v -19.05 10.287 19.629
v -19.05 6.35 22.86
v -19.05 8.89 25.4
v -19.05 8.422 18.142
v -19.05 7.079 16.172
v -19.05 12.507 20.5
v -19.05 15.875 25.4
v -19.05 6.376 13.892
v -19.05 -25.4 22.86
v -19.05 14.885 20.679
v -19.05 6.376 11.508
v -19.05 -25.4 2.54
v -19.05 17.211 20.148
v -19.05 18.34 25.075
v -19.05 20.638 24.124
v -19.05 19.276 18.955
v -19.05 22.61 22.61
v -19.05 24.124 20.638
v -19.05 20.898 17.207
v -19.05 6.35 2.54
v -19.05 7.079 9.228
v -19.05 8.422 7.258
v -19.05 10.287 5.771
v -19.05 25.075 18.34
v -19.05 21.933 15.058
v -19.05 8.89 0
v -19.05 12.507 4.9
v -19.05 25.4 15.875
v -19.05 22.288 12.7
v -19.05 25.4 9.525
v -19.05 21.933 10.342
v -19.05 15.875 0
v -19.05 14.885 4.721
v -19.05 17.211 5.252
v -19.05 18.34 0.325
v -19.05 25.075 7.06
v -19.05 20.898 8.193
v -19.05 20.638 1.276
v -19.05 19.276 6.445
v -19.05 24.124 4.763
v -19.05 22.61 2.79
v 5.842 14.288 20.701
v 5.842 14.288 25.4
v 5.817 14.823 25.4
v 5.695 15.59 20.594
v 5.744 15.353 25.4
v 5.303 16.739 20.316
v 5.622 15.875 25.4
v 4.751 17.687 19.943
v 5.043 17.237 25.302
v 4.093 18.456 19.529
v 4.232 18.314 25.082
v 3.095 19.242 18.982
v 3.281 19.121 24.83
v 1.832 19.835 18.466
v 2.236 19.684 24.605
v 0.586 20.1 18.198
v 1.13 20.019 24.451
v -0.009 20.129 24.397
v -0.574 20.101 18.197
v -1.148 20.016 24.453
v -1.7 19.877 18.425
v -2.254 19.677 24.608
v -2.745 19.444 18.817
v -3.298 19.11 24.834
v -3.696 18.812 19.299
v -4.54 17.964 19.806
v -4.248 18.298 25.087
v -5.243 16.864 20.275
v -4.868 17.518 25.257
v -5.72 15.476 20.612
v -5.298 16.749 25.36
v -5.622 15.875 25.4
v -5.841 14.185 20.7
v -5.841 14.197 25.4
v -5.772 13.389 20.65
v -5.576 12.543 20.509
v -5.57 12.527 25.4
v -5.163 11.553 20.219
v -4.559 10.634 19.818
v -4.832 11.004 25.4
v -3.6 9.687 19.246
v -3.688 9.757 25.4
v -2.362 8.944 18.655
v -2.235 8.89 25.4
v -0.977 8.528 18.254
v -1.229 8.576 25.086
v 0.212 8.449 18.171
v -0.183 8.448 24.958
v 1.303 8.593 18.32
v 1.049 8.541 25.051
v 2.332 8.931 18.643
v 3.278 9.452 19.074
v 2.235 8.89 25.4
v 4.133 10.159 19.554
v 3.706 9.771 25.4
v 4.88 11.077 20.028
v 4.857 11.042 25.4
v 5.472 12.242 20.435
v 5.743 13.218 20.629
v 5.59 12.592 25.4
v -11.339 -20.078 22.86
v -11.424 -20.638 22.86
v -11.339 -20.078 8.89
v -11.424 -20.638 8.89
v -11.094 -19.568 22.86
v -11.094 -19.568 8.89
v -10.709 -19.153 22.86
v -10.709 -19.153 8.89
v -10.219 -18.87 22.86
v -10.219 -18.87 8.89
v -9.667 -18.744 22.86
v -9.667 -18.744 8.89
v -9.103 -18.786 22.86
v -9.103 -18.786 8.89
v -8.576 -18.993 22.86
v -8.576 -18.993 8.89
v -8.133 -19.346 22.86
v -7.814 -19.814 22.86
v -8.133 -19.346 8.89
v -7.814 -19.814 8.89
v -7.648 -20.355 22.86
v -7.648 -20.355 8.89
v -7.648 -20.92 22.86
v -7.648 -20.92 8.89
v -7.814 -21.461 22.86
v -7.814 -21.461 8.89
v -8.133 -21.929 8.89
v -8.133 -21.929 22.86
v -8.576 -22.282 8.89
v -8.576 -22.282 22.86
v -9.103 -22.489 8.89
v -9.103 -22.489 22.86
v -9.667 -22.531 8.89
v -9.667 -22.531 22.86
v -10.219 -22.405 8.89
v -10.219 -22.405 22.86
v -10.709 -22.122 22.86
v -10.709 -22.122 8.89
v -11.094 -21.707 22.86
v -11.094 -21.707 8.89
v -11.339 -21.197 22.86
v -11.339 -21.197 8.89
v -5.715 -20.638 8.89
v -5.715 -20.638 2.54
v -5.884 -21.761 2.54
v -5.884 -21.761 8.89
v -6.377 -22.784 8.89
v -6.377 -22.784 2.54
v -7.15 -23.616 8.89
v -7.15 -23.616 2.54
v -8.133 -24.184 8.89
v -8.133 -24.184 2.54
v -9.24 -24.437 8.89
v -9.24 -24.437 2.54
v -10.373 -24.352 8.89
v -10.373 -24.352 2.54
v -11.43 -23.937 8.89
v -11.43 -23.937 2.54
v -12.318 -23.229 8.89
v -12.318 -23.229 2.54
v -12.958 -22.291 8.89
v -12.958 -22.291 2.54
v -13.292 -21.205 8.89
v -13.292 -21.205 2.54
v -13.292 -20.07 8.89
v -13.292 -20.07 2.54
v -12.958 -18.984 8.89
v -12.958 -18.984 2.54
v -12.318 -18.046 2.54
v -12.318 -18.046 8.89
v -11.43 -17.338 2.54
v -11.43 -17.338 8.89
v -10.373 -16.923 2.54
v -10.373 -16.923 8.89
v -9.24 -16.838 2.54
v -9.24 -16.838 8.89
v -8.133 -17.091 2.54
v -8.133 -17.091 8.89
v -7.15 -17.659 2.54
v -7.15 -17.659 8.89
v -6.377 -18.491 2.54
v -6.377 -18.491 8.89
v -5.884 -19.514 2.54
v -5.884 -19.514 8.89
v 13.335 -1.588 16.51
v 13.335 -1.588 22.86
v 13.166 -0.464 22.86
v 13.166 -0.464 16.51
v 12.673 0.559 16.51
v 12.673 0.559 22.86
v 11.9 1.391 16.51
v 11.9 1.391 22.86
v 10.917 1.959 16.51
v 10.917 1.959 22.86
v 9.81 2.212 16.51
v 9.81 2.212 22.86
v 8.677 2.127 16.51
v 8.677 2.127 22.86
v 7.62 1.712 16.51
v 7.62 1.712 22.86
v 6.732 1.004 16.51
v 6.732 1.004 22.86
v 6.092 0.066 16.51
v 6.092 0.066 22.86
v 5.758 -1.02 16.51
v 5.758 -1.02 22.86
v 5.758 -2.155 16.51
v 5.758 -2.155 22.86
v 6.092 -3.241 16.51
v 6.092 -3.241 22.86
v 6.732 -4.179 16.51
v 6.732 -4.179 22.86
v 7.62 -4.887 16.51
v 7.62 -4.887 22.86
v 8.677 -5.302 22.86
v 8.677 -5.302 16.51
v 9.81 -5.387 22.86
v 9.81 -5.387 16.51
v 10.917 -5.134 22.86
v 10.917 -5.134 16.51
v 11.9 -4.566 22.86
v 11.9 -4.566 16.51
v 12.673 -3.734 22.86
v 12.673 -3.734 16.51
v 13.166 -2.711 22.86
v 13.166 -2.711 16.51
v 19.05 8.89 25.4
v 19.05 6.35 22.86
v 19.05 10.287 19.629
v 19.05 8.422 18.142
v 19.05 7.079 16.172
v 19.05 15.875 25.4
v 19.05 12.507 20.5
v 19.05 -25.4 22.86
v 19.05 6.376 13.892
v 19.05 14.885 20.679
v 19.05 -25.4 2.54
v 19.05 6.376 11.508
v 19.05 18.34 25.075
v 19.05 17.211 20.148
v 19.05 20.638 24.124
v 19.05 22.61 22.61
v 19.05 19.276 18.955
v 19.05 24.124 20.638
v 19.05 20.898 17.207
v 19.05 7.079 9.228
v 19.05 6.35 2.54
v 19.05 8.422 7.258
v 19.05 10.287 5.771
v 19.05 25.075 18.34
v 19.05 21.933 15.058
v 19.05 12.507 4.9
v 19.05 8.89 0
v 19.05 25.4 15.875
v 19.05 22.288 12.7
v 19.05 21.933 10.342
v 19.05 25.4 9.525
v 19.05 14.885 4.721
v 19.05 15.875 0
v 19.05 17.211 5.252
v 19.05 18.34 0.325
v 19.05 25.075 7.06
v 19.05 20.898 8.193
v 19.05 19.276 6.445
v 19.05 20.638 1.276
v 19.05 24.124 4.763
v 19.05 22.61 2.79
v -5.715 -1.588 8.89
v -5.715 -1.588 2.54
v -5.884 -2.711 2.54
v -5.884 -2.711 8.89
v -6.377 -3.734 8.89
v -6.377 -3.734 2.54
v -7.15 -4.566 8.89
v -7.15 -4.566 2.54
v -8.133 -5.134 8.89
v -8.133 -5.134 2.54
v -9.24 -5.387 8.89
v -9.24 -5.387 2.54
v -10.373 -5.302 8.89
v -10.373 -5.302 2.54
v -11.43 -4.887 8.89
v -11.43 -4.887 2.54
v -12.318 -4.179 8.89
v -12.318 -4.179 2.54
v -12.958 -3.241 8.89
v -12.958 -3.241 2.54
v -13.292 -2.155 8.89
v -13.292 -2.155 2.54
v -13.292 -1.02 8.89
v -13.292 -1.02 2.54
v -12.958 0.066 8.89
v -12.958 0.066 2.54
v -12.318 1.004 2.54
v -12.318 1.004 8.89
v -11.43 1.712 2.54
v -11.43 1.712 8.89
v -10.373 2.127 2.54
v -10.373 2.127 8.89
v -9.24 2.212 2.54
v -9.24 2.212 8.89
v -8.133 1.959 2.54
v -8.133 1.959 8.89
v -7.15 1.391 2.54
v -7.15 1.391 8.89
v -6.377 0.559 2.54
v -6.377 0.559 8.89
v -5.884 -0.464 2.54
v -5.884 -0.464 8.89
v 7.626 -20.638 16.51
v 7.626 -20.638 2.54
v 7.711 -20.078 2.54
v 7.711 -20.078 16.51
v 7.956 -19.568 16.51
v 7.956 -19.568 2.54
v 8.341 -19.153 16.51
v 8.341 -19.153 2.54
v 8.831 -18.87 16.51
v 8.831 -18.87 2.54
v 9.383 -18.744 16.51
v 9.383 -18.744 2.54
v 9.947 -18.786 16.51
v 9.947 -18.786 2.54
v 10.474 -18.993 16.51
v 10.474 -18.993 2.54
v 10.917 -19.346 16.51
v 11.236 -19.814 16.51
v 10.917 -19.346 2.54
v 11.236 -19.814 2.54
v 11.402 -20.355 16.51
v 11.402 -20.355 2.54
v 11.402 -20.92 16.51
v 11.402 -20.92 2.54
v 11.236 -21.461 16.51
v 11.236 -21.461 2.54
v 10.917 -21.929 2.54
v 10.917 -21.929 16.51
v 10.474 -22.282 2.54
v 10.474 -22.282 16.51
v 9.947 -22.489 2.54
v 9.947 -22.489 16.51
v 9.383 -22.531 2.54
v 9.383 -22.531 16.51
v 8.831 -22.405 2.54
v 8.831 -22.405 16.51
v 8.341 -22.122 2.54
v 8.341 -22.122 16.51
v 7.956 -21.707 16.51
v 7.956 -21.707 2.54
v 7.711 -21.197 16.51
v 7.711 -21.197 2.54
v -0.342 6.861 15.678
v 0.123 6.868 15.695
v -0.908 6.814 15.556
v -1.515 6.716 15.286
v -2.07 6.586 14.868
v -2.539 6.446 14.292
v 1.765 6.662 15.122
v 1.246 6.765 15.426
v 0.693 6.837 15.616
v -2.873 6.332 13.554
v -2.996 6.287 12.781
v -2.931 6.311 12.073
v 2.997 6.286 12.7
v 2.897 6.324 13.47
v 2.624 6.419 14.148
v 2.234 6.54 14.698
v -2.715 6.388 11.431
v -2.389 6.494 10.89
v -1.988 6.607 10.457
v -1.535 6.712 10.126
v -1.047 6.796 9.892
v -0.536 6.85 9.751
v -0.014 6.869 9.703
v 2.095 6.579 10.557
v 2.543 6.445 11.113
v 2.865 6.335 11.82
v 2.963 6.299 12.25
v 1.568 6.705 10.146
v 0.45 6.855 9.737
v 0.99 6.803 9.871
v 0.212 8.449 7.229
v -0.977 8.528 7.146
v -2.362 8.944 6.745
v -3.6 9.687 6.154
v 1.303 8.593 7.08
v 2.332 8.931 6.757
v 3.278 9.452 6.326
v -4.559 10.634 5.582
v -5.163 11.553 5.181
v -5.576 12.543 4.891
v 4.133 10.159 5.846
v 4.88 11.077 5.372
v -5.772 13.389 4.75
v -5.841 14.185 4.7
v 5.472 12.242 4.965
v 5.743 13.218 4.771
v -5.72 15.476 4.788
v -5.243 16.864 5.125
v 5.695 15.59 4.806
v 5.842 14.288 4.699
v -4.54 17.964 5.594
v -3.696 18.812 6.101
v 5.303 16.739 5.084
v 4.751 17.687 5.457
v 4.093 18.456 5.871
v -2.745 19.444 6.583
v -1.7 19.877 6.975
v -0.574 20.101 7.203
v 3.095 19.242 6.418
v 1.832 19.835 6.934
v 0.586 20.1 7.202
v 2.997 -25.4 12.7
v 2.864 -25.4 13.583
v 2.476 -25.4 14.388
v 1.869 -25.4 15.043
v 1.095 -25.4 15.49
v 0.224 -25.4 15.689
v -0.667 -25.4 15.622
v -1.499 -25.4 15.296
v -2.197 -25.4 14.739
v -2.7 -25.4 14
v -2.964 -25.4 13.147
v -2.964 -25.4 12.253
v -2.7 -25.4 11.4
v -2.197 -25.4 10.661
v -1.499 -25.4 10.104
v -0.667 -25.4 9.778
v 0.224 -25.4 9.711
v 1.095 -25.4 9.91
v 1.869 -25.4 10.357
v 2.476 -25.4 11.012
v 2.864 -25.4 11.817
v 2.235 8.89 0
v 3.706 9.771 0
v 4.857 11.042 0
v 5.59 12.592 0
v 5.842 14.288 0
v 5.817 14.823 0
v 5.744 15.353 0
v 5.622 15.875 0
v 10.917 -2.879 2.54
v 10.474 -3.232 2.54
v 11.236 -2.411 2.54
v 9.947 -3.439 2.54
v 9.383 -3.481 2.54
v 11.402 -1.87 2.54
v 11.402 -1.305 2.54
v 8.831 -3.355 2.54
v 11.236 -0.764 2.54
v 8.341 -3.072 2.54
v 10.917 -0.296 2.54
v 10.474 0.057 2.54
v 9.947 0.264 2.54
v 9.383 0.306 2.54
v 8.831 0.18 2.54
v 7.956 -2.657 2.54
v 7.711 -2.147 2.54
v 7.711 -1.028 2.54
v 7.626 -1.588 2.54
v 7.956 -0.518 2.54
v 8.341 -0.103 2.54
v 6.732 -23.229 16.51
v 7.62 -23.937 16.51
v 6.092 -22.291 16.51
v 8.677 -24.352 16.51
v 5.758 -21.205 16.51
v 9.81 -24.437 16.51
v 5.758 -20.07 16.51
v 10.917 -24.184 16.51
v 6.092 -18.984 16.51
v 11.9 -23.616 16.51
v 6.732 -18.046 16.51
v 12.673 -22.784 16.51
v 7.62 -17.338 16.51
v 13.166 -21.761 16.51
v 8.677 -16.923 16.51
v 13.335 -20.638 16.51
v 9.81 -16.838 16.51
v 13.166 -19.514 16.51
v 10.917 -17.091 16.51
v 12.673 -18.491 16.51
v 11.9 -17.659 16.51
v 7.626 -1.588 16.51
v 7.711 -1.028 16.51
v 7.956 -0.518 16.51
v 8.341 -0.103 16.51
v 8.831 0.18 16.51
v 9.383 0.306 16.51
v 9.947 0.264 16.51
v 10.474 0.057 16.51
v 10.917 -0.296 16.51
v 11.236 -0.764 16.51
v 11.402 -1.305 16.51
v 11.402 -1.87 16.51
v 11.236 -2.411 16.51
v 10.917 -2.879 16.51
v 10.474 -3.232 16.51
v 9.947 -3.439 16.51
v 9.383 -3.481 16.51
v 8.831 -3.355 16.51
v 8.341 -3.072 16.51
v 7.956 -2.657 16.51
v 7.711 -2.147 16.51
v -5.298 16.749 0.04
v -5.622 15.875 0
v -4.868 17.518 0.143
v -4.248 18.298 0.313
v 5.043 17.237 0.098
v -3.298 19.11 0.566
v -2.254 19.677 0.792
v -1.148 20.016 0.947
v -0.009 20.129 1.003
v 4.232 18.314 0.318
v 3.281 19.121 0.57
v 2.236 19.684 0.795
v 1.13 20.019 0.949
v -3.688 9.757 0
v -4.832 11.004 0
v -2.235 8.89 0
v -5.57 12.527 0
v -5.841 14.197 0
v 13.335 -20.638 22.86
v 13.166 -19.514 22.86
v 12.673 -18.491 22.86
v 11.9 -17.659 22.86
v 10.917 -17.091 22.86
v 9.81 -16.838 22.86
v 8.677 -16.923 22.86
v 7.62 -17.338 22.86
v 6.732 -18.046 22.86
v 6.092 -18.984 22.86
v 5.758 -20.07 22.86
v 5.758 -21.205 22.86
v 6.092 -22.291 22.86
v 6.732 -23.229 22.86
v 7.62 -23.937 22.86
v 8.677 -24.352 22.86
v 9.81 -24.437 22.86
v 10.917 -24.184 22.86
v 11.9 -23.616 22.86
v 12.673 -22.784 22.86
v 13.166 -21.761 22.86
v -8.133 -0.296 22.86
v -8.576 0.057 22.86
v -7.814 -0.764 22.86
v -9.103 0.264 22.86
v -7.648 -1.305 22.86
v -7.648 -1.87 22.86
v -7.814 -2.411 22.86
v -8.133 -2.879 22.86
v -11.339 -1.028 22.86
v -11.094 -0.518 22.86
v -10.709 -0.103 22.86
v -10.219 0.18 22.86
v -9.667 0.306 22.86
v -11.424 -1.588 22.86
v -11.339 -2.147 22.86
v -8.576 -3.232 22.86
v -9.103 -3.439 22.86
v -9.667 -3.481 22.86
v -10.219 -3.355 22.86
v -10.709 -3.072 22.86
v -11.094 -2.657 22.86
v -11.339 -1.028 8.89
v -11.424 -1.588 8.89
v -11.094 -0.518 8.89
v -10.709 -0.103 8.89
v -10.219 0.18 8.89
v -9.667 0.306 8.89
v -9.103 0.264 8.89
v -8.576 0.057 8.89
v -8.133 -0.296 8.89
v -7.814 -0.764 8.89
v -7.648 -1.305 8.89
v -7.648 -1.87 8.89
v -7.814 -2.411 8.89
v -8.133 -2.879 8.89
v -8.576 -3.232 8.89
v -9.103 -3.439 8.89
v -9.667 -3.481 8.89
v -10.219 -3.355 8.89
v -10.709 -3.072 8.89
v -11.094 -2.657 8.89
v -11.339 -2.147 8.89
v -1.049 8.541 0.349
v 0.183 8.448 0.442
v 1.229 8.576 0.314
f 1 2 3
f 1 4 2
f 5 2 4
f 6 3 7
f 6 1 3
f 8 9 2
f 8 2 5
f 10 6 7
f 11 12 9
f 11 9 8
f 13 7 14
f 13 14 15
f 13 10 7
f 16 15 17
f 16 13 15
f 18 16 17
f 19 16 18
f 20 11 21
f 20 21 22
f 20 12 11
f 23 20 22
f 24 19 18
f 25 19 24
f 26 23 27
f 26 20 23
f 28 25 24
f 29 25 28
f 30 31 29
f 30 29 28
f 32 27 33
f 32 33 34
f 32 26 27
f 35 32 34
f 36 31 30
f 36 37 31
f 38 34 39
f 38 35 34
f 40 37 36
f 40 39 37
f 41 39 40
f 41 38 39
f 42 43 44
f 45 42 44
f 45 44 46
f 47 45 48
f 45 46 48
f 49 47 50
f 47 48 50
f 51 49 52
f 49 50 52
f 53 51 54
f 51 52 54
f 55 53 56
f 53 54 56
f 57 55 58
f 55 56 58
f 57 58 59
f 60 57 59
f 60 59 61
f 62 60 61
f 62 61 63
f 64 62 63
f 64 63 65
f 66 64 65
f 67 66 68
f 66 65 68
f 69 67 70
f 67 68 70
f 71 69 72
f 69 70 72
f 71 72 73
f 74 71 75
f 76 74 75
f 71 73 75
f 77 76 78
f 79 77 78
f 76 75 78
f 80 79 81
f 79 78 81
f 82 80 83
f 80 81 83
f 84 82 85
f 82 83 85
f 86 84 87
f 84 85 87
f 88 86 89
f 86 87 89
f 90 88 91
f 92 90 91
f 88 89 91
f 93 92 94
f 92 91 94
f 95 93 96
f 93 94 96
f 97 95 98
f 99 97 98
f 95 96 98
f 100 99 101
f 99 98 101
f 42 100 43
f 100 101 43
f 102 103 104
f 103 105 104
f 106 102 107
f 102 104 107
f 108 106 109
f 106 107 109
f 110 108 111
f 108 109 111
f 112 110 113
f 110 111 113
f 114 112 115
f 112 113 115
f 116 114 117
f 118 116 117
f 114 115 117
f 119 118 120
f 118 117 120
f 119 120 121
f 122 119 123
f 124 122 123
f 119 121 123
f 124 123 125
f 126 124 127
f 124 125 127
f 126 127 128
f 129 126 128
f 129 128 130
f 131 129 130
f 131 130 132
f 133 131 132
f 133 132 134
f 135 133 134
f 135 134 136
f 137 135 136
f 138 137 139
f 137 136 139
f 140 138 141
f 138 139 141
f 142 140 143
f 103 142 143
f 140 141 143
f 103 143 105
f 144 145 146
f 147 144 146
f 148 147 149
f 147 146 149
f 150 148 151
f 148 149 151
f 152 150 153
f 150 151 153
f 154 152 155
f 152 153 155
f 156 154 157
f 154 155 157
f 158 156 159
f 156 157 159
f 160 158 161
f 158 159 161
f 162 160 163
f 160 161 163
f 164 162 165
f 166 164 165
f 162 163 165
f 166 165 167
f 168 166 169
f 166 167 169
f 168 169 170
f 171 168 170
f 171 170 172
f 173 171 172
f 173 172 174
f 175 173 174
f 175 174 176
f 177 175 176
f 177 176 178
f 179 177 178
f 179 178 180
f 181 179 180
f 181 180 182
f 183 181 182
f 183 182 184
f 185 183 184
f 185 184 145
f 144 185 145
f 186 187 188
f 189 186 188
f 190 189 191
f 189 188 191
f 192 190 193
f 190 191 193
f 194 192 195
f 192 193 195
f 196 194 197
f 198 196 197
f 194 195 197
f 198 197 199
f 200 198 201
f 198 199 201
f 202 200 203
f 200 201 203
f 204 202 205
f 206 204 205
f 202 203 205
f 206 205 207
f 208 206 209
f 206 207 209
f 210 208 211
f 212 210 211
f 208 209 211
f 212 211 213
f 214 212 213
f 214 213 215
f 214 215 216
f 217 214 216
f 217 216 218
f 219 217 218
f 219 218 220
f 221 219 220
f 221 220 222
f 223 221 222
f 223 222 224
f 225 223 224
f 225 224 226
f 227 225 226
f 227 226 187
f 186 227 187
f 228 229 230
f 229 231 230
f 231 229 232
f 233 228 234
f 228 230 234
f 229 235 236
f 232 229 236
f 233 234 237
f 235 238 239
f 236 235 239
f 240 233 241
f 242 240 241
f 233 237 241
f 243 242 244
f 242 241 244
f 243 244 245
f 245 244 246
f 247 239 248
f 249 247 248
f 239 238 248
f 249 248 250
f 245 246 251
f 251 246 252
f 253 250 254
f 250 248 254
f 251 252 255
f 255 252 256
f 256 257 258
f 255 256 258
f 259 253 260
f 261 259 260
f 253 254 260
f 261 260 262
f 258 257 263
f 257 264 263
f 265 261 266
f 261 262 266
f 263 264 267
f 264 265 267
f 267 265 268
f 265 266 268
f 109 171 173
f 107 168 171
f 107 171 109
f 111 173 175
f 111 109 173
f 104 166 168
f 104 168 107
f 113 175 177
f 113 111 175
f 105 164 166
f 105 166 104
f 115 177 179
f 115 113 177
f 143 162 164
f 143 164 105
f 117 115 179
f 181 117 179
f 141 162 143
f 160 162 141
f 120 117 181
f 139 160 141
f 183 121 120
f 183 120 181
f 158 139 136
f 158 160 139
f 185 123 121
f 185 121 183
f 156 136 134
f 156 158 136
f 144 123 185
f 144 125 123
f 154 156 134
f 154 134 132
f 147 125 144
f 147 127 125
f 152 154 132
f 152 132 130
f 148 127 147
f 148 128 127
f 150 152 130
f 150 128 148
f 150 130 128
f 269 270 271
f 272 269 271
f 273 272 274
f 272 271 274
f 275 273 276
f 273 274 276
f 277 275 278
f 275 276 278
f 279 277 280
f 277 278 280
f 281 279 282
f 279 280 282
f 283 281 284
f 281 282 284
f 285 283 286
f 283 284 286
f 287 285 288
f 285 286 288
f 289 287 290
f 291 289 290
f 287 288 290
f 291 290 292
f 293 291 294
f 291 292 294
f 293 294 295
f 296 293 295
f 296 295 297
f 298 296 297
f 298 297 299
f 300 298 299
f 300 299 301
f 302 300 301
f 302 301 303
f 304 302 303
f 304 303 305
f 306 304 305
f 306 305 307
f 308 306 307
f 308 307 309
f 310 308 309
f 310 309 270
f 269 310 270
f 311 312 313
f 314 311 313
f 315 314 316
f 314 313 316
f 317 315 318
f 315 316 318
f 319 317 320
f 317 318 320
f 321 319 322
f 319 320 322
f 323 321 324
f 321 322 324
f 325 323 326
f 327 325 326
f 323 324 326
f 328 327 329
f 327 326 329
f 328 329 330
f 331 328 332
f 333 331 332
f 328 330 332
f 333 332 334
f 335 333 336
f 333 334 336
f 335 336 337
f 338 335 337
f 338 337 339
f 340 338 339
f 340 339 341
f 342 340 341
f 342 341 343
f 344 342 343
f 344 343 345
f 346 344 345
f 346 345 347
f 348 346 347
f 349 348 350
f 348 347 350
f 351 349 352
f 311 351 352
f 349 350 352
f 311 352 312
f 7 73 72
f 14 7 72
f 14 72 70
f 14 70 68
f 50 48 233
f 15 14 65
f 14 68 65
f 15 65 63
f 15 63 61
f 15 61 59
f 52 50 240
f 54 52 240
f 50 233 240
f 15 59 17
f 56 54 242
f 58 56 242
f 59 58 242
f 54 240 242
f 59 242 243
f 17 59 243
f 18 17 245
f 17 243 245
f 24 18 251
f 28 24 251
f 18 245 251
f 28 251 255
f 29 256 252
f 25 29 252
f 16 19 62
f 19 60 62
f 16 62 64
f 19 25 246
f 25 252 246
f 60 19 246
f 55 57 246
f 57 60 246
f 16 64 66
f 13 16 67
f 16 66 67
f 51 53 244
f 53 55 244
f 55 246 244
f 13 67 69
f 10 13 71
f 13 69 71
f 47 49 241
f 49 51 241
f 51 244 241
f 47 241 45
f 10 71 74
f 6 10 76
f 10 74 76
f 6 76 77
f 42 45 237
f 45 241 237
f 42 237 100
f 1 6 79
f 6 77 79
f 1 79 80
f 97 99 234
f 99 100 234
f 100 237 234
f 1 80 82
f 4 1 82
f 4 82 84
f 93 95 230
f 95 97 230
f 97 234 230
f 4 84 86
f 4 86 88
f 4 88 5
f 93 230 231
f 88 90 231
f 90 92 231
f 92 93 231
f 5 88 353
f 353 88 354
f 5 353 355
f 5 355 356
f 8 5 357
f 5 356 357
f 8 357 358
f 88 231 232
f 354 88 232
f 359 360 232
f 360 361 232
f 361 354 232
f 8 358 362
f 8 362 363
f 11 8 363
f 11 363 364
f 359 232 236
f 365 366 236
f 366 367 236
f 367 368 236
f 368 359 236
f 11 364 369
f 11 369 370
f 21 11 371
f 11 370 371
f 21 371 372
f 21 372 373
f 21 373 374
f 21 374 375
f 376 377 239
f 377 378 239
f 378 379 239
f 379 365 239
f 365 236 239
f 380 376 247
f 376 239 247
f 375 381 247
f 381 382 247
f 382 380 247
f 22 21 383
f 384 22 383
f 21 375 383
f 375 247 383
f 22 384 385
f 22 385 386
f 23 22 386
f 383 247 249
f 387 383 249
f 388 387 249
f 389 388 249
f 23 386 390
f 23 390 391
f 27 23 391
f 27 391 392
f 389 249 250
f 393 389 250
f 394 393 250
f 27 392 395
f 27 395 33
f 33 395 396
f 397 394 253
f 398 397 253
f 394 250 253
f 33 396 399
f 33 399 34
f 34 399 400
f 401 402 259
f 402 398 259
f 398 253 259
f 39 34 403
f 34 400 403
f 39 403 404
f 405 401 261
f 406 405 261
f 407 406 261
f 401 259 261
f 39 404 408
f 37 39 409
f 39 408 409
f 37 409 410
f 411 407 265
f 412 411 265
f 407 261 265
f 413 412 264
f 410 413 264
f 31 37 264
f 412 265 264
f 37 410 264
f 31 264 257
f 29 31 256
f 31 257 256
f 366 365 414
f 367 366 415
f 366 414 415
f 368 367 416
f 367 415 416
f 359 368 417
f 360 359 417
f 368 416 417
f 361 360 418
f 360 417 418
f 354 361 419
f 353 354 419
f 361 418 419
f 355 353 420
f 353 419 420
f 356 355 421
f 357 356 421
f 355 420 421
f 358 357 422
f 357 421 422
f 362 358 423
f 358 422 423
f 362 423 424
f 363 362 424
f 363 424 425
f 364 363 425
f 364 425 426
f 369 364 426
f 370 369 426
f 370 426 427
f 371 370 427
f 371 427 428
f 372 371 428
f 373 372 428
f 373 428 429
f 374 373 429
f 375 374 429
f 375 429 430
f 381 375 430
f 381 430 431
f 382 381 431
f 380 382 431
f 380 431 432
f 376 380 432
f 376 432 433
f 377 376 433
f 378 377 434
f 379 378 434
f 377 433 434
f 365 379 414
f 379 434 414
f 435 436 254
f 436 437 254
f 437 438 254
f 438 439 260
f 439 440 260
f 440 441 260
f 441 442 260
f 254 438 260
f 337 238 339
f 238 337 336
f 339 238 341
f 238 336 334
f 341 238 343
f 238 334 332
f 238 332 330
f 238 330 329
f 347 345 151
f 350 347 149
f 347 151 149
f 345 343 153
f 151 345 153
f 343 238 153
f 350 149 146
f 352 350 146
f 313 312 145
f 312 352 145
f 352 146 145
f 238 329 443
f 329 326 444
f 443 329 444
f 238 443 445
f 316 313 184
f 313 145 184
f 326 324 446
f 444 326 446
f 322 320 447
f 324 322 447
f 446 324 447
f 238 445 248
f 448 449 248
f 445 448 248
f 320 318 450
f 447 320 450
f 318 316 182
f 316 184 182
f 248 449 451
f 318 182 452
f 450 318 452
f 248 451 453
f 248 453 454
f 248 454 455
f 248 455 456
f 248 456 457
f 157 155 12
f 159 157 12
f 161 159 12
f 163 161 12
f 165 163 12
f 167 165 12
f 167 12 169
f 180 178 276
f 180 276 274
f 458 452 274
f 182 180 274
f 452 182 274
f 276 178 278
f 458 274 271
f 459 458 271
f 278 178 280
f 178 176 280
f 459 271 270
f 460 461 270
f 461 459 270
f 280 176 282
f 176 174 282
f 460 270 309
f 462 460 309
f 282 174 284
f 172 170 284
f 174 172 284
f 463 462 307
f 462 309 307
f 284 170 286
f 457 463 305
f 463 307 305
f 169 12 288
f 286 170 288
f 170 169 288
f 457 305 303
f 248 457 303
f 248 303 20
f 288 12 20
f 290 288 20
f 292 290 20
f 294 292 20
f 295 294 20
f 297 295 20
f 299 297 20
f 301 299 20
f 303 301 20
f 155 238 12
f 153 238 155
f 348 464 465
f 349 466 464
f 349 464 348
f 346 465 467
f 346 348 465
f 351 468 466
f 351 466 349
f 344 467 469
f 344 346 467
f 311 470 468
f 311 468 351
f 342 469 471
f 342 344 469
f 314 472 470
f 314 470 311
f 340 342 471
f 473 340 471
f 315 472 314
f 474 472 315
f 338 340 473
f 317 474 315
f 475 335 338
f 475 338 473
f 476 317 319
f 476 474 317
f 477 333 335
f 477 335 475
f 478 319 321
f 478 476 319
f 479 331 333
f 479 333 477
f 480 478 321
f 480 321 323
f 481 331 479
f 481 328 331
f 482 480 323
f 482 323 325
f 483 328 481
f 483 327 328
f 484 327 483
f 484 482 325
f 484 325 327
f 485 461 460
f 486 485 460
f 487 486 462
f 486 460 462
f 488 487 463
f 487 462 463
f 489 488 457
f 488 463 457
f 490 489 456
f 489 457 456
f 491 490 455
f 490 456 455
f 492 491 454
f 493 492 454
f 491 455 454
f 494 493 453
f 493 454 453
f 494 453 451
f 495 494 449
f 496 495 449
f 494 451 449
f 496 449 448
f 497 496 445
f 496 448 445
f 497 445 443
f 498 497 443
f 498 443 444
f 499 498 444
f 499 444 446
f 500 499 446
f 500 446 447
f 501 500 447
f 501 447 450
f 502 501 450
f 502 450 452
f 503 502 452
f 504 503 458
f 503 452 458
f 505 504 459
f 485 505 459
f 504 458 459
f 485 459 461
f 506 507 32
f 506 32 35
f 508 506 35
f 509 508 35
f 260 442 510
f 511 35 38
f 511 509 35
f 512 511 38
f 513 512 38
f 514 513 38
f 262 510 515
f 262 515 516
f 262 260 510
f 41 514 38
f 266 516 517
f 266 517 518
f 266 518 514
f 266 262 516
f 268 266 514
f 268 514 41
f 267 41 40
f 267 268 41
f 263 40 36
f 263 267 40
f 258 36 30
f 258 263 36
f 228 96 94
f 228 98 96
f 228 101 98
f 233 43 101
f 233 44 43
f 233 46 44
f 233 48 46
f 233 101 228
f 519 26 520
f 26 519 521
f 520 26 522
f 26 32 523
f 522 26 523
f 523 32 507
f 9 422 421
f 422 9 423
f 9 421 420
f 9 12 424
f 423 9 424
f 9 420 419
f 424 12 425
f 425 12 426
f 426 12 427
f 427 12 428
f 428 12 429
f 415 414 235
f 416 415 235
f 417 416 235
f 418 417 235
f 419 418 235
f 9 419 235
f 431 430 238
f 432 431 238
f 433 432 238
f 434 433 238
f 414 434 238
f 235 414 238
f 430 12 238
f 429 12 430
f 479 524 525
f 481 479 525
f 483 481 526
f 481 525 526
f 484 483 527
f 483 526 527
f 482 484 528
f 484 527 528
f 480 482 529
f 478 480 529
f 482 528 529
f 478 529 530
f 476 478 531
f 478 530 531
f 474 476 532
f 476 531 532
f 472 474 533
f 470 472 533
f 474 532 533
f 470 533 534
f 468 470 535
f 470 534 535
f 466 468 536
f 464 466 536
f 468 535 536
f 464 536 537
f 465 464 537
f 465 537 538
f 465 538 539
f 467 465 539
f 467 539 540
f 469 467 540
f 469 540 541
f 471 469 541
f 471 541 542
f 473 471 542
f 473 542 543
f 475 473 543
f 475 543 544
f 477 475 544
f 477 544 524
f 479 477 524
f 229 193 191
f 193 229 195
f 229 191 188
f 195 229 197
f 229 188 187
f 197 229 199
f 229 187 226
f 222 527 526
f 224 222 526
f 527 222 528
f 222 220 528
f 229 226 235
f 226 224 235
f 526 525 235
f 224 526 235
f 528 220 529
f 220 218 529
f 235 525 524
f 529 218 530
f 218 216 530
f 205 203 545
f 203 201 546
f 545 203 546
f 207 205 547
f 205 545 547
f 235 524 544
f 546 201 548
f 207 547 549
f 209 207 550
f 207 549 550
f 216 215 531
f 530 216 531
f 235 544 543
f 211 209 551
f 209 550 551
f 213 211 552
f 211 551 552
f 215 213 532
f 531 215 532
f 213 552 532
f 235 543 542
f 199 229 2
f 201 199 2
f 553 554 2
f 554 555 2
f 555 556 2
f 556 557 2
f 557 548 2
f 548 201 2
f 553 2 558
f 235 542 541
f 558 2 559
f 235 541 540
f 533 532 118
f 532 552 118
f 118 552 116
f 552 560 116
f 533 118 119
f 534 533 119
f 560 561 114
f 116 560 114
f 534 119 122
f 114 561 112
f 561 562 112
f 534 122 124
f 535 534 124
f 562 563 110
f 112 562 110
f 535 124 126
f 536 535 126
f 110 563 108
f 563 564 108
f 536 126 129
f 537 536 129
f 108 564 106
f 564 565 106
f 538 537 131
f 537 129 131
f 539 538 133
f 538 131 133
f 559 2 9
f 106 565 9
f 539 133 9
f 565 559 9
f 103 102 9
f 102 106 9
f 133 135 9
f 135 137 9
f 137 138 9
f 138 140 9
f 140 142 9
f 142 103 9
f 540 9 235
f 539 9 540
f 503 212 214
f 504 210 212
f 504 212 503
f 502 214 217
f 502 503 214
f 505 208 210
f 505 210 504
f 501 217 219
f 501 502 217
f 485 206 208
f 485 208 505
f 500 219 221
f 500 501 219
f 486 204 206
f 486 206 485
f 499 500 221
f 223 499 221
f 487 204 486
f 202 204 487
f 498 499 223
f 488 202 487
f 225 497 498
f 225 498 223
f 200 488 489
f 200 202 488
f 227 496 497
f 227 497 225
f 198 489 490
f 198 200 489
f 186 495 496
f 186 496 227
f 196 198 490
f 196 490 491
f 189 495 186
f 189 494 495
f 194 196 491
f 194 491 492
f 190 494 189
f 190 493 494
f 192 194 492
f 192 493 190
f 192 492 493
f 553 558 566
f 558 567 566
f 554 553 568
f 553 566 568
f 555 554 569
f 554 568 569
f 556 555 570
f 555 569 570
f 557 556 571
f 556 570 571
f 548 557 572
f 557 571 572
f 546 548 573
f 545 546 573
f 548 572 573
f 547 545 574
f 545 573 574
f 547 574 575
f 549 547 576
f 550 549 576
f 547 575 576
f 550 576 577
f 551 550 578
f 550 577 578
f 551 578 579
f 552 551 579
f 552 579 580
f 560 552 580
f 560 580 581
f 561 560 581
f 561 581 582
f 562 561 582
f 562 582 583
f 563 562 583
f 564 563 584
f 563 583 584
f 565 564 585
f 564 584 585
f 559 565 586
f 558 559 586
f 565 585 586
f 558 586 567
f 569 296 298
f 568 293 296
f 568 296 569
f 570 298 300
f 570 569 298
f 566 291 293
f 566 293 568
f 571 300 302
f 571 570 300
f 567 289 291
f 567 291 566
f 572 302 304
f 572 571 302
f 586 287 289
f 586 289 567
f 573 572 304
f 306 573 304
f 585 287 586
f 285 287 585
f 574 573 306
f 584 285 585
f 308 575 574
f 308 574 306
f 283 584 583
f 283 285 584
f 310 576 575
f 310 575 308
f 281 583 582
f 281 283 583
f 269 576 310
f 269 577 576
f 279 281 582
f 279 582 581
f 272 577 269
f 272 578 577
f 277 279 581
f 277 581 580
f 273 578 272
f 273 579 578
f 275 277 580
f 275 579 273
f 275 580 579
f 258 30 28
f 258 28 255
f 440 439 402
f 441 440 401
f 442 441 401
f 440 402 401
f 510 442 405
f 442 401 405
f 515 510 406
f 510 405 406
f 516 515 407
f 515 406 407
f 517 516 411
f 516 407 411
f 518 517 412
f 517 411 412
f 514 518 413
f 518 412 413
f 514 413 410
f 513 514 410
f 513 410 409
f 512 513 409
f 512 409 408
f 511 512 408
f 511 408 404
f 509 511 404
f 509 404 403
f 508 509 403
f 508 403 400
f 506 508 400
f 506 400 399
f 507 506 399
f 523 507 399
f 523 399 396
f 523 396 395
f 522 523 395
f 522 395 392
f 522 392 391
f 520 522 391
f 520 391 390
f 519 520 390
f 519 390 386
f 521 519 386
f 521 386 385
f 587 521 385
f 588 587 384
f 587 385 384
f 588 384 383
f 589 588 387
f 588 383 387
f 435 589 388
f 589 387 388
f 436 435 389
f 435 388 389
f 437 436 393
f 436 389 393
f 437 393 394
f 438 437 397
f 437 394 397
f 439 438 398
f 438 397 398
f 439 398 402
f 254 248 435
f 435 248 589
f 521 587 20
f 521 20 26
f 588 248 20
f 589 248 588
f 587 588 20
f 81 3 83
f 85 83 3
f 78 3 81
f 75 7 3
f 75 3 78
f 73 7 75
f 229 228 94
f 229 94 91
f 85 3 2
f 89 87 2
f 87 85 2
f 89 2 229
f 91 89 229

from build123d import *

# Parameters (mm, degrees)
F0_W           = 38.1
F0_H           = 50.8
F1_DEPTH       = 25.4
F2_R           = 8.001
F3_DEPTH       = 38.101
F4_R           = 2.9972
F5_DEPTH       = 32.270091028
F6_R           = 9.525
F8_D           = 3.7973
F8_CSINK_D     = 4.318
F8_CSINK_ANGLE = 90
F9_R           = 3.81
F10_DEPTH      = 8.89
F11_R          = 3.81
F12_DEPTH      = 8.89
F14_DEPTH      = 38.1010001
F15_R          = 5.842
F16_DEPTH      = 25.401


with BuildPart() as f1:
    # F0 (on Top) → F1 (new body)
    with BuildSketch(Plane.XY):
        Rectangle(F0_W, F0_H)
    extrude(amount=F1_DEPTH)

    # F2 (on face) → F3 (cut, through all)
    with BuildSketch(Plane.YZ.offset(19.05)):
        with Locations((14.2875, 12.7)):
            Circle(F2_R)
    extrude(amount=-F3_DEPTH, mode=Mode.SUBTRACT)

    # F4 (on face) → F5 (cut, through all)
    with BuildSketch(Plane.XZ.offset(25.4)):
        with Locations((0, 12.7)):
            Circle(F4_R)
    extrude(amount=-F5_DEPTH, mode=Mode.SUBTRACT)

    # F6
    f6_edges = [f1.edges().sort_by_distance(p)[0] for p in [
        (0, 25.4, 25.4),
        (0, 25.4, 0),
    ]]
    fillet(f6_edges, radius=F6_R)

    # F8 (through all)
    with Locations(Plane.XY.offset(25.4)):
        with Locations((-9.525, -1.5875), (-9.525, -20.6375), (9.525, -20.6375), (9.525, -1.5875)):
            CounterSinkHole(F8_D / 2, F8_CSINK_D / 2, counter_sink_angle=F8_CSINK_ANGLE)

    # F9 (on face) → F10 (cut)
    with BuildSketch(Plane.XY.offset(25.4)):
        with Locations((9.525, -1.5875)):
            Circle(F9_R)
        with Locations((9.525, -20.6375)):
            Circle(F9_R)
    extrude(amount=-F10_DEPTH, mode=Mode.SUBTRACT)

    # F11 (on face) → F12 (cut)
    with BuildSketch(Plane(origin=(0, 0, 0), x_dir=(1, 0, 0), z_dir=(0, 0, -1))):
        with Locations((-9.525, 20.6375)):
            Circle(F11_R)
        with Locations((-9.525, 1.5875)):
            Circle(F11_R)
    extrude(amount=-F12_DEPTH, mode=Mode.SUBTRACT)

    # F13 (on face) → F14 (cut, through all)
    with BuildSketch(Plane(origin=(-19.05, 0, 0), x_dir=(0, -1, 0), z_dir=(-1, 0, 0))):
        Polygon((25.4, 22.86), (25.4, 25.4), (-8.89, 25.4), (-6.35, 22.86), align=None)
        Polygon((-8.89, 0), (25.4, 0), (25.4, 2.54), (-6.35, 2.54), align=None)
    extrude(amount=-F14_DEPTH, mode=Mode.SUBTRACT)

    # F15 (on face) → F16 (cut, through all)
    with BuildSketch(Plane.XY.offset(25.4)):
        with Locations((0, 14.2875)):
            Circle(F15_R)
    extrude(amount=-F16_DEPTH, mode=Mode.SUBTRACT)


solid = f1.part
